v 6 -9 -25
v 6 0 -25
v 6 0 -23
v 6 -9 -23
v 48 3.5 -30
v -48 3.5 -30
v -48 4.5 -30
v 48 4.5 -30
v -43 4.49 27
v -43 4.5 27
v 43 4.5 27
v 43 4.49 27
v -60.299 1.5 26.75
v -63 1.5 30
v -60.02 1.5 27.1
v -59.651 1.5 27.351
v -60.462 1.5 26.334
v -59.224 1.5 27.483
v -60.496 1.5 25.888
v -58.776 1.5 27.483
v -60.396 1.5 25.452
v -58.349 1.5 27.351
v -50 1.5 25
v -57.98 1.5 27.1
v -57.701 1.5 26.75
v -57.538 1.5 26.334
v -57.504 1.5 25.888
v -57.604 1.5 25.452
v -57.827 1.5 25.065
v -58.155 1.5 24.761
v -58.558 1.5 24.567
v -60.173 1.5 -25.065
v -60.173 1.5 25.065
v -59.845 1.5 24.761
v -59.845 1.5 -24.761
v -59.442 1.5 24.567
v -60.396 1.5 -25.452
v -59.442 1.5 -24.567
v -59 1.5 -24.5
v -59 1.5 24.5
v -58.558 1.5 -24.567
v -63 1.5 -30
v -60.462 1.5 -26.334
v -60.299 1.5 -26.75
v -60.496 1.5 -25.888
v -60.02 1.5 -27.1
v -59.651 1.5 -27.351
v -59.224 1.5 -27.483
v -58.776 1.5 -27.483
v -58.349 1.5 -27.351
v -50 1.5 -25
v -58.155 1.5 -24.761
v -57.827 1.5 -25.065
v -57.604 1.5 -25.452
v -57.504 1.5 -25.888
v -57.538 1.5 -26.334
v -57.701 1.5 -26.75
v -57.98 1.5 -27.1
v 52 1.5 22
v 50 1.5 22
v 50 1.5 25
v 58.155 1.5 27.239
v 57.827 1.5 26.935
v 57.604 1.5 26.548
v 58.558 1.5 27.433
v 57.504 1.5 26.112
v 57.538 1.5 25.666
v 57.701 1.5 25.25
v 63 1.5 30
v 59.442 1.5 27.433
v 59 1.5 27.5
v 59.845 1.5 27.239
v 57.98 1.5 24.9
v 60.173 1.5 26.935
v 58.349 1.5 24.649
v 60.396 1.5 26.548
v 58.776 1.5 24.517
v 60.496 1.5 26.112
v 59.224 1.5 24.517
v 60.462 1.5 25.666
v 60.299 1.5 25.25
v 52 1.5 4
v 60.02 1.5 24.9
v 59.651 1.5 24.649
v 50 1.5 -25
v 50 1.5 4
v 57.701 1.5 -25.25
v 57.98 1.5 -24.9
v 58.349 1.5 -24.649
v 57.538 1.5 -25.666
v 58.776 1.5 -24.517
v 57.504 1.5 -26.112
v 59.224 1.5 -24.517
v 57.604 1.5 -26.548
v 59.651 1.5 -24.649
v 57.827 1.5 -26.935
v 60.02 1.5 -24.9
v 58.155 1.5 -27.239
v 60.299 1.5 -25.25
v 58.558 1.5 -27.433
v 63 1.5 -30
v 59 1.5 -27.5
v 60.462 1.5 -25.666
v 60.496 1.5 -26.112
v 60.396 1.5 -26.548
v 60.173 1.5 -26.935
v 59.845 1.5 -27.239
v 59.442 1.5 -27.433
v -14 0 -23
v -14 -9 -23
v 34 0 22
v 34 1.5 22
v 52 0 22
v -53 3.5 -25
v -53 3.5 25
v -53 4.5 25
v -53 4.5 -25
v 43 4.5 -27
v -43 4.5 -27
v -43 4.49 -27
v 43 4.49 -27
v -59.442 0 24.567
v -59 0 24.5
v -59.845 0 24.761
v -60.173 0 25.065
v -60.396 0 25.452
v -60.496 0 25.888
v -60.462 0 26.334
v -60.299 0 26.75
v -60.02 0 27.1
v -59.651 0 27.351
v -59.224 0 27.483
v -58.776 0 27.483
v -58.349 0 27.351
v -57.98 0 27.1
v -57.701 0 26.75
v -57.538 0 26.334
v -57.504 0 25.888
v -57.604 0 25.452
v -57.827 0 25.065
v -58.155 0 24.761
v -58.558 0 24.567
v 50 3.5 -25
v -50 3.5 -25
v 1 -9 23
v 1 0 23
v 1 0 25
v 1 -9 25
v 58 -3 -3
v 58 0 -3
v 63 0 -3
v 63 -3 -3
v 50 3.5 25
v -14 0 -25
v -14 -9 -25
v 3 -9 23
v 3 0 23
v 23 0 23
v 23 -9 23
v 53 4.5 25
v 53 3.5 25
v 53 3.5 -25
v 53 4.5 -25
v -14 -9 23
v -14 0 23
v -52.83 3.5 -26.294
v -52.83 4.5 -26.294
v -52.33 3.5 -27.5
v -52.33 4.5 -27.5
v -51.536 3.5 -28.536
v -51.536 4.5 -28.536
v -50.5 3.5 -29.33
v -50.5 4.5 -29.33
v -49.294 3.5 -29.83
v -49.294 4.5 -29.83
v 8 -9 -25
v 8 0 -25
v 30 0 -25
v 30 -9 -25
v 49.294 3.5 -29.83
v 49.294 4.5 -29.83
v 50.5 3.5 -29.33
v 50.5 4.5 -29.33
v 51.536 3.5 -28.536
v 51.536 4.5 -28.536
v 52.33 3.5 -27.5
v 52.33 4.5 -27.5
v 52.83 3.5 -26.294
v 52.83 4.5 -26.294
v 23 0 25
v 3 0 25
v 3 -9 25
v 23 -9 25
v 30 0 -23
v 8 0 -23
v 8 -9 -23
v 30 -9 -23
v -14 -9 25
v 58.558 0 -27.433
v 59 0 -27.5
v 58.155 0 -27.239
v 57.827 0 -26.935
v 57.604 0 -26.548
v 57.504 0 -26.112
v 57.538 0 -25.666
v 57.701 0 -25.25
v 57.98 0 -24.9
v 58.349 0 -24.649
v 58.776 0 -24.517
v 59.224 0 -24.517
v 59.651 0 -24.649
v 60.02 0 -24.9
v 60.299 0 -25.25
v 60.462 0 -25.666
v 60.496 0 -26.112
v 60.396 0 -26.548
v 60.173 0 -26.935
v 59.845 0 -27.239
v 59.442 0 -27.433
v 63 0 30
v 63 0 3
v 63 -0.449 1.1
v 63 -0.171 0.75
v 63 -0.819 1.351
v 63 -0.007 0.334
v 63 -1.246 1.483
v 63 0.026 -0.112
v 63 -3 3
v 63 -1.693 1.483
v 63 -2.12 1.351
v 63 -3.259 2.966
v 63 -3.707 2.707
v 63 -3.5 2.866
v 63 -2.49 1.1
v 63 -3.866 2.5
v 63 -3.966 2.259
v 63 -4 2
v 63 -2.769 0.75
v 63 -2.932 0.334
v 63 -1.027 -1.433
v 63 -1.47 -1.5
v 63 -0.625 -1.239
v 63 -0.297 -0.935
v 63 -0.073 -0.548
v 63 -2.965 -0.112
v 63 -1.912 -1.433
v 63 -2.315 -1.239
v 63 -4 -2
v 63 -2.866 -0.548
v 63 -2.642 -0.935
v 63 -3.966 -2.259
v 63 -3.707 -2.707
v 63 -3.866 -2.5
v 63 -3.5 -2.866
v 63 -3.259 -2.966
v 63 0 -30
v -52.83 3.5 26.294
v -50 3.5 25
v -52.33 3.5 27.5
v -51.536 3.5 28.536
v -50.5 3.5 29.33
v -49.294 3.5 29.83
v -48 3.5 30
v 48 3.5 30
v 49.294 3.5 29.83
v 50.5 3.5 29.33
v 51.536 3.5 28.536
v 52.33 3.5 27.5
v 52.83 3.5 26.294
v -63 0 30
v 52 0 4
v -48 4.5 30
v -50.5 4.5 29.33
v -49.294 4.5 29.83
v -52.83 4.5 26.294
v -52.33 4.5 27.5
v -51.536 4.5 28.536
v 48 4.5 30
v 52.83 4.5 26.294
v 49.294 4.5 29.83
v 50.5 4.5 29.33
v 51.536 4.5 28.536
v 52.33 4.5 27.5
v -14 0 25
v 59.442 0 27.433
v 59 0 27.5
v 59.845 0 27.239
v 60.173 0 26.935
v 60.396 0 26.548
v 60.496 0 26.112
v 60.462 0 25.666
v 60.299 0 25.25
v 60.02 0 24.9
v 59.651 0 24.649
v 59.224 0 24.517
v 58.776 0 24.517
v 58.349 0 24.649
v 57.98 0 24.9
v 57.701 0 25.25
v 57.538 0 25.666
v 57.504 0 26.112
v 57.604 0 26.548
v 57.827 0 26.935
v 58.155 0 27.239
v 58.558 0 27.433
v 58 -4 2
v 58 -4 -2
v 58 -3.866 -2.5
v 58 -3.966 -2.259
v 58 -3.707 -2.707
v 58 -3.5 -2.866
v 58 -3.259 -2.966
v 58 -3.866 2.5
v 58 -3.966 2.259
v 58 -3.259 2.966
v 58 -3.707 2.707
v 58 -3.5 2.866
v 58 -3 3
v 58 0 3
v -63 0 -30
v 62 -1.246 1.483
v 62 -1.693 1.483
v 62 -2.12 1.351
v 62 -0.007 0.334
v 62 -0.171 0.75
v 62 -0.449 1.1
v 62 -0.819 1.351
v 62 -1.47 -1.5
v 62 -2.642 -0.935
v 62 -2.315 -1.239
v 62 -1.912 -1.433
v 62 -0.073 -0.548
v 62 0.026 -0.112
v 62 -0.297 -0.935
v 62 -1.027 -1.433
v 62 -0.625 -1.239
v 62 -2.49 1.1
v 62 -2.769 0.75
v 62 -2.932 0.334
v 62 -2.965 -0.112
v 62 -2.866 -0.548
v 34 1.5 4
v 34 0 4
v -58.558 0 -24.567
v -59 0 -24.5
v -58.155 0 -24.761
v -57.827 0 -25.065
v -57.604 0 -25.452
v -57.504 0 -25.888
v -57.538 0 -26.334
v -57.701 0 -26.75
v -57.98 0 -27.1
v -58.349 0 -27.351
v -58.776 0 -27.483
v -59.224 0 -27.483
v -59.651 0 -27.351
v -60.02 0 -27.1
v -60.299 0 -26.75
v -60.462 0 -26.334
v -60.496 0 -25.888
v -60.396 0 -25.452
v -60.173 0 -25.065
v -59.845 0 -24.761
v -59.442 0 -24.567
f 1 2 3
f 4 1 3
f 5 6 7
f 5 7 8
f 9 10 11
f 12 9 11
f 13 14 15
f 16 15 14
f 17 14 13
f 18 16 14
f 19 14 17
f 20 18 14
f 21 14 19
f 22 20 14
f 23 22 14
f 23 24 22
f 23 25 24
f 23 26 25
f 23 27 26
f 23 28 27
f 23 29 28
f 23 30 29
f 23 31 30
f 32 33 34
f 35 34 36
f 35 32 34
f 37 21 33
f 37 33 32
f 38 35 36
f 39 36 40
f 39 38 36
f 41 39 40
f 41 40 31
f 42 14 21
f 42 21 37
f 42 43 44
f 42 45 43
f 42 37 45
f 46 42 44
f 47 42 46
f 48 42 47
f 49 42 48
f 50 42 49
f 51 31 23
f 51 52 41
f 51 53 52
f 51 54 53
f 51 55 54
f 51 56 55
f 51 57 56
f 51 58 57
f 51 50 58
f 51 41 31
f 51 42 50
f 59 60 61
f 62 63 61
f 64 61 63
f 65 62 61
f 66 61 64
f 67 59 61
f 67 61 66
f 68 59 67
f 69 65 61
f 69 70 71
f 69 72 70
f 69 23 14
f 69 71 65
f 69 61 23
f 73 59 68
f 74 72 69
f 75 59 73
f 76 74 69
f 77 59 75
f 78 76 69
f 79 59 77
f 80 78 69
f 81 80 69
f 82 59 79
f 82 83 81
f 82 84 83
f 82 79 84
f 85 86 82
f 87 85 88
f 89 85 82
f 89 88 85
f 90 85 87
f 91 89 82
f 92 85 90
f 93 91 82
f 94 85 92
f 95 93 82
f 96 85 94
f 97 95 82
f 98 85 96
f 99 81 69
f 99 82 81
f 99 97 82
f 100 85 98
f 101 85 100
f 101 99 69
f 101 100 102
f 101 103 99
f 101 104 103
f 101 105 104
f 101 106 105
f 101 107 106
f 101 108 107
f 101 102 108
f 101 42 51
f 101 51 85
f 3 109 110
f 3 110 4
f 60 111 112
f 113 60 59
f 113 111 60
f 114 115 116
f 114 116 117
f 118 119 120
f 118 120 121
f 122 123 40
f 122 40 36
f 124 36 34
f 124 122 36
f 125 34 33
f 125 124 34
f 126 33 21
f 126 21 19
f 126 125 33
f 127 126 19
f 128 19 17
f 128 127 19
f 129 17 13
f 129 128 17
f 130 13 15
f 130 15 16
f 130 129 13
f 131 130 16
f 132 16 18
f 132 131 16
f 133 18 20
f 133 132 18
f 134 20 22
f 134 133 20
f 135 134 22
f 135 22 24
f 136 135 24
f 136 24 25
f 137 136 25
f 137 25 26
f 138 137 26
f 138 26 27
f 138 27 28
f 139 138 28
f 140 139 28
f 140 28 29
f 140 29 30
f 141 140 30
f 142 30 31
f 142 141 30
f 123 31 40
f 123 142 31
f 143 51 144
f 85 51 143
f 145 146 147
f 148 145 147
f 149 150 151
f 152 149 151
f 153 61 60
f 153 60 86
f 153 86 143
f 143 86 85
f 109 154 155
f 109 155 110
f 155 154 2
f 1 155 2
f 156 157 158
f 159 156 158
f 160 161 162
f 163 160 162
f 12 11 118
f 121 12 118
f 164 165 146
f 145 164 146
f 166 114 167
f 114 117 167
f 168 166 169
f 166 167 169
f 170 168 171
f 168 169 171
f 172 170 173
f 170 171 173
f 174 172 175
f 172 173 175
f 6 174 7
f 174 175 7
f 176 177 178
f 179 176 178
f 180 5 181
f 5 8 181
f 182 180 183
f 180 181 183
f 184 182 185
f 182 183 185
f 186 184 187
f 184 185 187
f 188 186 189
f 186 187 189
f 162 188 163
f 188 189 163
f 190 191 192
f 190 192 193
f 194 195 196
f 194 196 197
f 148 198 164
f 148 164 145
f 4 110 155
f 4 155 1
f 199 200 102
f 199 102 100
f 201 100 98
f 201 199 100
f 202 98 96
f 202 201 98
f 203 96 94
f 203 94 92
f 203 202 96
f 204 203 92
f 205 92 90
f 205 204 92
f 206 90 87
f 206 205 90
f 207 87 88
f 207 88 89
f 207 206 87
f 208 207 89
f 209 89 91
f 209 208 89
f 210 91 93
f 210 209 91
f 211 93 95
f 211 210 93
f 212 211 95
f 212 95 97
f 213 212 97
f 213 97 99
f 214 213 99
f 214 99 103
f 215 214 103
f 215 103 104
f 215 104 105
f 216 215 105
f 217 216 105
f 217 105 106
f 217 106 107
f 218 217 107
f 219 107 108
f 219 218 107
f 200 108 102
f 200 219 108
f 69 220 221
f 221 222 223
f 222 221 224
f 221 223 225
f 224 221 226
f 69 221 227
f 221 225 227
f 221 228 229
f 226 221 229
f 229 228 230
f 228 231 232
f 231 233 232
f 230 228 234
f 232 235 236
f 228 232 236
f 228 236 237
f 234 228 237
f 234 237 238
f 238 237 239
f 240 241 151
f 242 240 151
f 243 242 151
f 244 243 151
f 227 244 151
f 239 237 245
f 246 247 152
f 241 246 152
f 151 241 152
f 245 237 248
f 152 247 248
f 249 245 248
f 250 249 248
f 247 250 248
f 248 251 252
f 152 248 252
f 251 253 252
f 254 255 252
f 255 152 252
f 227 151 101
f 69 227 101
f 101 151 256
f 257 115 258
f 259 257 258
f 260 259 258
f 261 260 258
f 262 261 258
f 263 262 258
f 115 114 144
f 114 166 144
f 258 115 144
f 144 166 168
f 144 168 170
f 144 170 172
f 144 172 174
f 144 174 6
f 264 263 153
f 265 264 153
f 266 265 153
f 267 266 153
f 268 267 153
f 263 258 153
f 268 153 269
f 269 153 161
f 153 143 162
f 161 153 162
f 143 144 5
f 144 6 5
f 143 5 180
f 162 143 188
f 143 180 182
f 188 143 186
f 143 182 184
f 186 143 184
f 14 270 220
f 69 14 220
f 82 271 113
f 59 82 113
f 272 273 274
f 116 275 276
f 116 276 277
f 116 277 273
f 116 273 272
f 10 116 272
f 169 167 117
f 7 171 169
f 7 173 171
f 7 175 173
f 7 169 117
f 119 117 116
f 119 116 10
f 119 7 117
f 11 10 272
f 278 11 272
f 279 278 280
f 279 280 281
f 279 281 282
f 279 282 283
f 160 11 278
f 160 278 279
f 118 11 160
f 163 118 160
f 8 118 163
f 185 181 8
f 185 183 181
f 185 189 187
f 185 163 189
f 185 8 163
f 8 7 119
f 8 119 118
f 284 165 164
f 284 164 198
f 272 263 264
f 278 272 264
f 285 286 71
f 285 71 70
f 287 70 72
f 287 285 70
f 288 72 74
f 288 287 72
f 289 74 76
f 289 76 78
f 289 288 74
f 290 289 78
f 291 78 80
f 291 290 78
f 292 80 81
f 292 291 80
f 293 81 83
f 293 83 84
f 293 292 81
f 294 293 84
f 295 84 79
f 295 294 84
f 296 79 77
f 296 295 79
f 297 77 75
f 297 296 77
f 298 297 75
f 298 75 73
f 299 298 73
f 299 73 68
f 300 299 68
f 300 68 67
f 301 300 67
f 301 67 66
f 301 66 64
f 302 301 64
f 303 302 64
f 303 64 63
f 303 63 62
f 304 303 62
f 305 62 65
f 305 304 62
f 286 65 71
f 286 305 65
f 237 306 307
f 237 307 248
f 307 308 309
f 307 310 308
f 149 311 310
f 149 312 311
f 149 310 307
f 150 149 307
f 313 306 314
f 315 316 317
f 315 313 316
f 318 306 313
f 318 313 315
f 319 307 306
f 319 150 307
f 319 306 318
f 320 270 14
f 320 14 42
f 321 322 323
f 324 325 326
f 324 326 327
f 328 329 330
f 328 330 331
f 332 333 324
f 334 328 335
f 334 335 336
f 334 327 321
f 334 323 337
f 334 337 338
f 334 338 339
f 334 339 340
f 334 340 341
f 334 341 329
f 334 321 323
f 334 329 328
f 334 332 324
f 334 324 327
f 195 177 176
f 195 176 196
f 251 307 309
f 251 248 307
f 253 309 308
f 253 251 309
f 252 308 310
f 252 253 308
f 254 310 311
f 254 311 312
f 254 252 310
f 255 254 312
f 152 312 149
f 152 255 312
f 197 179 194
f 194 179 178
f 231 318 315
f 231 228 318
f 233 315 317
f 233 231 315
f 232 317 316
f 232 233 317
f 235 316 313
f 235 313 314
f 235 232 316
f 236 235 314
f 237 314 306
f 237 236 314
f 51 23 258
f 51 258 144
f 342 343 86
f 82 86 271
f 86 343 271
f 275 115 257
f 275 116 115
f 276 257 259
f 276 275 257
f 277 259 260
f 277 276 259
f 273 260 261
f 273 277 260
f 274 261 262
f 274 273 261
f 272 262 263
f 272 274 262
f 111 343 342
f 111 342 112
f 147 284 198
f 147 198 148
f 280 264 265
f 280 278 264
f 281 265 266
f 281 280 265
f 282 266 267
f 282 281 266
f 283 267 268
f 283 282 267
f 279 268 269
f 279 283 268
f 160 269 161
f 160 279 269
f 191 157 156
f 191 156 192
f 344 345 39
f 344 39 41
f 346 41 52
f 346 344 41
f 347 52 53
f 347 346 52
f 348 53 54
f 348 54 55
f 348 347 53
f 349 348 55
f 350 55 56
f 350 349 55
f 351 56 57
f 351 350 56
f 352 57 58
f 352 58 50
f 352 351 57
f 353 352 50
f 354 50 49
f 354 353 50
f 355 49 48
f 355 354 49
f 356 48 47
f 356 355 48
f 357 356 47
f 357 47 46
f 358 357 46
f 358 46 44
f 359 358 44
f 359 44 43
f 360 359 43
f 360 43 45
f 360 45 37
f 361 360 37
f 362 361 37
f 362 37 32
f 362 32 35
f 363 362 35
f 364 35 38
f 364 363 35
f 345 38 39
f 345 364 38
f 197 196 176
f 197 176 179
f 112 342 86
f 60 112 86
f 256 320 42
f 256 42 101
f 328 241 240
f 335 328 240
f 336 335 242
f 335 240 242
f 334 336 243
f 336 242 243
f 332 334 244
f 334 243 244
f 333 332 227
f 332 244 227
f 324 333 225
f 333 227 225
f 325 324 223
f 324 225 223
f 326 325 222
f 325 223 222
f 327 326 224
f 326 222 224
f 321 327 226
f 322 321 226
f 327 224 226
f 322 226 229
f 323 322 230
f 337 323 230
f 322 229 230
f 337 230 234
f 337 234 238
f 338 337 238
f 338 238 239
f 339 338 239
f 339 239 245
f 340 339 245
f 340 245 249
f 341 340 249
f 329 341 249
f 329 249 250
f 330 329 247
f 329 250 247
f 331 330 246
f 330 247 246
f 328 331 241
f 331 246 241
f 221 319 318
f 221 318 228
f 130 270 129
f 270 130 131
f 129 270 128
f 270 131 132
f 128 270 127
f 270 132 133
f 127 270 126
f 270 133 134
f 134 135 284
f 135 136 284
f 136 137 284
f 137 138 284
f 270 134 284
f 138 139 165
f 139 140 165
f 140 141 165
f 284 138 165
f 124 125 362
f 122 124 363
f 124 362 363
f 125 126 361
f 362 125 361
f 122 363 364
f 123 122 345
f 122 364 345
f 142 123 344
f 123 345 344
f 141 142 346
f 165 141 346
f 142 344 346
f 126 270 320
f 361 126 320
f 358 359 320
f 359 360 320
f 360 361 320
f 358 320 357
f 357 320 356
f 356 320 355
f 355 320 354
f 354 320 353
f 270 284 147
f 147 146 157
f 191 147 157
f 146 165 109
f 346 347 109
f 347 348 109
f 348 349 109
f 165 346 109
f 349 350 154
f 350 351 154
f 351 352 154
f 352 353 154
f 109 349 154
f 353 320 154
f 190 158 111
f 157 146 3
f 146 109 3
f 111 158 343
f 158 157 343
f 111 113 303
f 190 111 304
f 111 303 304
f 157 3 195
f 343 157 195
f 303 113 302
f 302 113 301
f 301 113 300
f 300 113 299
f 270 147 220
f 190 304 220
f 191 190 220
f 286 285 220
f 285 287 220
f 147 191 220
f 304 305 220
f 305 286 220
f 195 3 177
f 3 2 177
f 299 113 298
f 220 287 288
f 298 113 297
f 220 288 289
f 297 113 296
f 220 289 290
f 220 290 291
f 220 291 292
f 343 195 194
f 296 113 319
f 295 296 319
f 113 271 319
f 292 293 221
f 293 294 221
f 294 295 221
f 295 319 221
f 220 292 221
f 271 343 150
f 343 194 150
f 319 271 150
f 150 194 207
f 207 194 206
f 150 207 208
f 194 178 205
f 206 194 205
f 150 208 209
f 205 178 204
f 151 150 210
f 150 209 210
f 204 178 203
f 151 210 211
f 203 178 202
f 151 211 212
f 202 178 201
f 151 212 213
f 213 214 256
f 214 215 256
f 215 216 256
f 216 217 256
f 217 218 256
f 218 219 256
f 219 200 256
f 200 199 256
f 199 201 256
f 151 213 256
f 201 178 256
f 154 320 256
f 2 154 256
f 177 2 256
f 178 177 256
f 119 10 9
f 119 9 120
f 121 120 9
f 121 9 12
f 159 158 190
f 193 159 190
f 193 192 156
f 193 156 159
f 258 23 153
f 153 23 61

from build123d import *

# Parameters (mm, degrees)
SKETCH1_W           = 126
SKETCH1_H           = 60
SKETCH1_R           = 1.5
BOSS_EXTRUDE1_DEPTH = 1.5
SKETCH2_W           = 100
SKETCH2_H           = 50
BOSS_EXTRUDE2_DEPTH = 2
SKETCH3_W           = 106
SKETCH3_H           = 60
BOSS_EXTRUDE3_DEPTH = 1
FILLET1_R           = 5
SKETCH4_W           = 86
SKETCH4_H           = 54
CUT_EXTRUDE1_DEPTH  = 0.01
SKETCH6_W           = 18
SKETCH6_H           = 18
CUT_EXTRUDE2_DEPTH  = 1.5
SKETCH7_W           = 20
SKETCH7_H           = 2
SKETCH7_W_2         = 15
SKETCH7_W_3         = 25
BOSS_EXTRUDE4_DEPTH = 9
SKETCH8_W           = 3
SKETCH8_H           = 9
CUT_EXTRUDE3_DEPTH  = 2
SKETCH9_W           = 5
SKETCH9_H           = 6
BOSS_EXTRUDE5_DEPTH = 4
SKETCH10_R          = 1.5
CUT_EXTRUDE4_DEPTH  = 1
FILLET2_R           = 1


with BuildPart() as part:
    # Sketch1 → Boss-Extrude1 (new body)
    with BuildSketch(Plane(origin=(0, 0, 0), x_dir=(1, 0, 0), z_dir=(0, 1, 0))):
        Rectangle(SKETCH1_W, SKETCH1_H)
        with Locations(Location((-59, 26, 0), (0, 0, 270))):
            Circle(SKETCH1_R, mode=Mode.SUBTRACT)
        with Locations(Location((-59, -26, 0), (0, 0, 90))):
            Circle(SKETCH1_R, mode=Mode.SUBTRACT)
        with Locations(Location((59, -26, 0), (0, 0, 270))):
            Circle(SKETCH1_R, mode=Mode.SUBTRACT)
        with Locations(Location((59, 26, 0), (0, 0, 90))):
            Circle(SKETCH1_R, mode=Mode.SUBTRACT)
    extrude(amount=BOSS_EXTRUDE1_DEPTH)

    # Sketch2 → Boss-Extrude2 (add)
    with BuildSketch(Plane(origin=(0, 1.5, 0), x_dir=(1, 0, 0), z_dir=(0, 1, 0))):
        Rectangle(SKETCH2_W, SKETCH2_H)
    extrude(amount=BOSS_EXTRUDE2_DEPTH)

    # Sketch3 → Boss-Extrude3 (add)
    with BuildSketch(Plane(origin=(0, 3.5, 0), x_dir=(1, 0, 0), z_dir=(0, 1, 0))):
        Rectangle(SKETCH3_W, SKETCH3_H)
    extrude(amount=BOSS_EXTRUDE3_DEPTH)

    # Fillet1
    fillet1_edges = [part.edges().sort_by_distance(p)[0] for p in [
        (53, 4, 30),
        (53, 4, -30),
        (-53, 4, -30),
        (-53, 4, 30),
    ]]
    fillet(fillet1_edges, radius=FILLET1_R)

    # Sketch4 → Cut-Extrude1 (cut)
    with BuildSketch(Plane(origin=(0, 4.5, 0), x_dir=(1, 0, 0), z_dir=(0, 1, 0))):
        Rectangle(SKETCH4_W, SKETCH4_H)
    extrude(amount=-CUT_EXTRUDE1_DEPTH, mode=Mode.SUBTRACT)

    # Sketch6 → Cut-Extrude2 (cut)
    with BuildSketch(Plane.XZ):
        with Locations((43, 13)):
            Rectangle(SKETCH6_W, SKETCH6_H)
    extrude(amount=-CUT_EXTRUDE2_DEPTH, mode=Mode.SUBTRACT)

    # Sketch7 → Boss-Extrude4 (add)
    with BuildSketch(Plane.XZ):
        with Locations((13, 24)):
            Rectangle(SKETCH7_W, SKETCH7_H)
        with Locations((-6.5, 24)):
            Rectangle(SKETCH7_W_2, SKETCH7_H)
        with Locations((20.5, -24)):
            Rectangle(SKETCH7_W_3, SKETCH7_H)
        with Locations((-4, -24)):
            Rectangle(SKETCH7_W, SKETCH7_H)
    extrude(amount=BOSS_EXTRUDE4_DEPTH)

    # Sketch8 → Cut-Extrude3 (cut)
    with BuildSketch(Plane(origin=(0, 0, -25), x_dir=(-1, 0, 0), z_dir=(0, 0, -1))):
        with Locations((-31.5, -4.5)):
            Rectangle(SKETCH8_W, SKETCH8_H)
    extrude(amount=-CUT_EXTRUDE3_DEPTH, mode=Mode.SUBTRACT)

    # Sketch9 → Boss-Extrude5 (add)
    with BuildSketch(Plane.XZ):
        with Locations((60.5, 0)):
            Rectangle(SKETCH9_W, SKETCH9_H)
    extrude(amount=BOSS_EXTRUDE5_DEPTH)

    # Sketch10 → Cut-Extrude4 (cut)
    with BuildSketch(Plane(origin=(63, 0, 0), x_dir=(0, 0, -1), z_dir=(1, 0, 0))):
        with Locations((0, -1.469545864)):
            Circle(SKETCH10_R)
    extrude(amount=-CUT_EXTRUDE4_DEPTH, mode=Mode.SUBTRACT)

    # Fillet2
    fillet2_edges = [part.edges().sort_by_distance(p)[0] for p in [
        (60.5, -4, 3),
        (60.5, -4, -3),
    ]]
    fillet(fillet2_edges, radius=FILLET2_R)


solid = part.part
